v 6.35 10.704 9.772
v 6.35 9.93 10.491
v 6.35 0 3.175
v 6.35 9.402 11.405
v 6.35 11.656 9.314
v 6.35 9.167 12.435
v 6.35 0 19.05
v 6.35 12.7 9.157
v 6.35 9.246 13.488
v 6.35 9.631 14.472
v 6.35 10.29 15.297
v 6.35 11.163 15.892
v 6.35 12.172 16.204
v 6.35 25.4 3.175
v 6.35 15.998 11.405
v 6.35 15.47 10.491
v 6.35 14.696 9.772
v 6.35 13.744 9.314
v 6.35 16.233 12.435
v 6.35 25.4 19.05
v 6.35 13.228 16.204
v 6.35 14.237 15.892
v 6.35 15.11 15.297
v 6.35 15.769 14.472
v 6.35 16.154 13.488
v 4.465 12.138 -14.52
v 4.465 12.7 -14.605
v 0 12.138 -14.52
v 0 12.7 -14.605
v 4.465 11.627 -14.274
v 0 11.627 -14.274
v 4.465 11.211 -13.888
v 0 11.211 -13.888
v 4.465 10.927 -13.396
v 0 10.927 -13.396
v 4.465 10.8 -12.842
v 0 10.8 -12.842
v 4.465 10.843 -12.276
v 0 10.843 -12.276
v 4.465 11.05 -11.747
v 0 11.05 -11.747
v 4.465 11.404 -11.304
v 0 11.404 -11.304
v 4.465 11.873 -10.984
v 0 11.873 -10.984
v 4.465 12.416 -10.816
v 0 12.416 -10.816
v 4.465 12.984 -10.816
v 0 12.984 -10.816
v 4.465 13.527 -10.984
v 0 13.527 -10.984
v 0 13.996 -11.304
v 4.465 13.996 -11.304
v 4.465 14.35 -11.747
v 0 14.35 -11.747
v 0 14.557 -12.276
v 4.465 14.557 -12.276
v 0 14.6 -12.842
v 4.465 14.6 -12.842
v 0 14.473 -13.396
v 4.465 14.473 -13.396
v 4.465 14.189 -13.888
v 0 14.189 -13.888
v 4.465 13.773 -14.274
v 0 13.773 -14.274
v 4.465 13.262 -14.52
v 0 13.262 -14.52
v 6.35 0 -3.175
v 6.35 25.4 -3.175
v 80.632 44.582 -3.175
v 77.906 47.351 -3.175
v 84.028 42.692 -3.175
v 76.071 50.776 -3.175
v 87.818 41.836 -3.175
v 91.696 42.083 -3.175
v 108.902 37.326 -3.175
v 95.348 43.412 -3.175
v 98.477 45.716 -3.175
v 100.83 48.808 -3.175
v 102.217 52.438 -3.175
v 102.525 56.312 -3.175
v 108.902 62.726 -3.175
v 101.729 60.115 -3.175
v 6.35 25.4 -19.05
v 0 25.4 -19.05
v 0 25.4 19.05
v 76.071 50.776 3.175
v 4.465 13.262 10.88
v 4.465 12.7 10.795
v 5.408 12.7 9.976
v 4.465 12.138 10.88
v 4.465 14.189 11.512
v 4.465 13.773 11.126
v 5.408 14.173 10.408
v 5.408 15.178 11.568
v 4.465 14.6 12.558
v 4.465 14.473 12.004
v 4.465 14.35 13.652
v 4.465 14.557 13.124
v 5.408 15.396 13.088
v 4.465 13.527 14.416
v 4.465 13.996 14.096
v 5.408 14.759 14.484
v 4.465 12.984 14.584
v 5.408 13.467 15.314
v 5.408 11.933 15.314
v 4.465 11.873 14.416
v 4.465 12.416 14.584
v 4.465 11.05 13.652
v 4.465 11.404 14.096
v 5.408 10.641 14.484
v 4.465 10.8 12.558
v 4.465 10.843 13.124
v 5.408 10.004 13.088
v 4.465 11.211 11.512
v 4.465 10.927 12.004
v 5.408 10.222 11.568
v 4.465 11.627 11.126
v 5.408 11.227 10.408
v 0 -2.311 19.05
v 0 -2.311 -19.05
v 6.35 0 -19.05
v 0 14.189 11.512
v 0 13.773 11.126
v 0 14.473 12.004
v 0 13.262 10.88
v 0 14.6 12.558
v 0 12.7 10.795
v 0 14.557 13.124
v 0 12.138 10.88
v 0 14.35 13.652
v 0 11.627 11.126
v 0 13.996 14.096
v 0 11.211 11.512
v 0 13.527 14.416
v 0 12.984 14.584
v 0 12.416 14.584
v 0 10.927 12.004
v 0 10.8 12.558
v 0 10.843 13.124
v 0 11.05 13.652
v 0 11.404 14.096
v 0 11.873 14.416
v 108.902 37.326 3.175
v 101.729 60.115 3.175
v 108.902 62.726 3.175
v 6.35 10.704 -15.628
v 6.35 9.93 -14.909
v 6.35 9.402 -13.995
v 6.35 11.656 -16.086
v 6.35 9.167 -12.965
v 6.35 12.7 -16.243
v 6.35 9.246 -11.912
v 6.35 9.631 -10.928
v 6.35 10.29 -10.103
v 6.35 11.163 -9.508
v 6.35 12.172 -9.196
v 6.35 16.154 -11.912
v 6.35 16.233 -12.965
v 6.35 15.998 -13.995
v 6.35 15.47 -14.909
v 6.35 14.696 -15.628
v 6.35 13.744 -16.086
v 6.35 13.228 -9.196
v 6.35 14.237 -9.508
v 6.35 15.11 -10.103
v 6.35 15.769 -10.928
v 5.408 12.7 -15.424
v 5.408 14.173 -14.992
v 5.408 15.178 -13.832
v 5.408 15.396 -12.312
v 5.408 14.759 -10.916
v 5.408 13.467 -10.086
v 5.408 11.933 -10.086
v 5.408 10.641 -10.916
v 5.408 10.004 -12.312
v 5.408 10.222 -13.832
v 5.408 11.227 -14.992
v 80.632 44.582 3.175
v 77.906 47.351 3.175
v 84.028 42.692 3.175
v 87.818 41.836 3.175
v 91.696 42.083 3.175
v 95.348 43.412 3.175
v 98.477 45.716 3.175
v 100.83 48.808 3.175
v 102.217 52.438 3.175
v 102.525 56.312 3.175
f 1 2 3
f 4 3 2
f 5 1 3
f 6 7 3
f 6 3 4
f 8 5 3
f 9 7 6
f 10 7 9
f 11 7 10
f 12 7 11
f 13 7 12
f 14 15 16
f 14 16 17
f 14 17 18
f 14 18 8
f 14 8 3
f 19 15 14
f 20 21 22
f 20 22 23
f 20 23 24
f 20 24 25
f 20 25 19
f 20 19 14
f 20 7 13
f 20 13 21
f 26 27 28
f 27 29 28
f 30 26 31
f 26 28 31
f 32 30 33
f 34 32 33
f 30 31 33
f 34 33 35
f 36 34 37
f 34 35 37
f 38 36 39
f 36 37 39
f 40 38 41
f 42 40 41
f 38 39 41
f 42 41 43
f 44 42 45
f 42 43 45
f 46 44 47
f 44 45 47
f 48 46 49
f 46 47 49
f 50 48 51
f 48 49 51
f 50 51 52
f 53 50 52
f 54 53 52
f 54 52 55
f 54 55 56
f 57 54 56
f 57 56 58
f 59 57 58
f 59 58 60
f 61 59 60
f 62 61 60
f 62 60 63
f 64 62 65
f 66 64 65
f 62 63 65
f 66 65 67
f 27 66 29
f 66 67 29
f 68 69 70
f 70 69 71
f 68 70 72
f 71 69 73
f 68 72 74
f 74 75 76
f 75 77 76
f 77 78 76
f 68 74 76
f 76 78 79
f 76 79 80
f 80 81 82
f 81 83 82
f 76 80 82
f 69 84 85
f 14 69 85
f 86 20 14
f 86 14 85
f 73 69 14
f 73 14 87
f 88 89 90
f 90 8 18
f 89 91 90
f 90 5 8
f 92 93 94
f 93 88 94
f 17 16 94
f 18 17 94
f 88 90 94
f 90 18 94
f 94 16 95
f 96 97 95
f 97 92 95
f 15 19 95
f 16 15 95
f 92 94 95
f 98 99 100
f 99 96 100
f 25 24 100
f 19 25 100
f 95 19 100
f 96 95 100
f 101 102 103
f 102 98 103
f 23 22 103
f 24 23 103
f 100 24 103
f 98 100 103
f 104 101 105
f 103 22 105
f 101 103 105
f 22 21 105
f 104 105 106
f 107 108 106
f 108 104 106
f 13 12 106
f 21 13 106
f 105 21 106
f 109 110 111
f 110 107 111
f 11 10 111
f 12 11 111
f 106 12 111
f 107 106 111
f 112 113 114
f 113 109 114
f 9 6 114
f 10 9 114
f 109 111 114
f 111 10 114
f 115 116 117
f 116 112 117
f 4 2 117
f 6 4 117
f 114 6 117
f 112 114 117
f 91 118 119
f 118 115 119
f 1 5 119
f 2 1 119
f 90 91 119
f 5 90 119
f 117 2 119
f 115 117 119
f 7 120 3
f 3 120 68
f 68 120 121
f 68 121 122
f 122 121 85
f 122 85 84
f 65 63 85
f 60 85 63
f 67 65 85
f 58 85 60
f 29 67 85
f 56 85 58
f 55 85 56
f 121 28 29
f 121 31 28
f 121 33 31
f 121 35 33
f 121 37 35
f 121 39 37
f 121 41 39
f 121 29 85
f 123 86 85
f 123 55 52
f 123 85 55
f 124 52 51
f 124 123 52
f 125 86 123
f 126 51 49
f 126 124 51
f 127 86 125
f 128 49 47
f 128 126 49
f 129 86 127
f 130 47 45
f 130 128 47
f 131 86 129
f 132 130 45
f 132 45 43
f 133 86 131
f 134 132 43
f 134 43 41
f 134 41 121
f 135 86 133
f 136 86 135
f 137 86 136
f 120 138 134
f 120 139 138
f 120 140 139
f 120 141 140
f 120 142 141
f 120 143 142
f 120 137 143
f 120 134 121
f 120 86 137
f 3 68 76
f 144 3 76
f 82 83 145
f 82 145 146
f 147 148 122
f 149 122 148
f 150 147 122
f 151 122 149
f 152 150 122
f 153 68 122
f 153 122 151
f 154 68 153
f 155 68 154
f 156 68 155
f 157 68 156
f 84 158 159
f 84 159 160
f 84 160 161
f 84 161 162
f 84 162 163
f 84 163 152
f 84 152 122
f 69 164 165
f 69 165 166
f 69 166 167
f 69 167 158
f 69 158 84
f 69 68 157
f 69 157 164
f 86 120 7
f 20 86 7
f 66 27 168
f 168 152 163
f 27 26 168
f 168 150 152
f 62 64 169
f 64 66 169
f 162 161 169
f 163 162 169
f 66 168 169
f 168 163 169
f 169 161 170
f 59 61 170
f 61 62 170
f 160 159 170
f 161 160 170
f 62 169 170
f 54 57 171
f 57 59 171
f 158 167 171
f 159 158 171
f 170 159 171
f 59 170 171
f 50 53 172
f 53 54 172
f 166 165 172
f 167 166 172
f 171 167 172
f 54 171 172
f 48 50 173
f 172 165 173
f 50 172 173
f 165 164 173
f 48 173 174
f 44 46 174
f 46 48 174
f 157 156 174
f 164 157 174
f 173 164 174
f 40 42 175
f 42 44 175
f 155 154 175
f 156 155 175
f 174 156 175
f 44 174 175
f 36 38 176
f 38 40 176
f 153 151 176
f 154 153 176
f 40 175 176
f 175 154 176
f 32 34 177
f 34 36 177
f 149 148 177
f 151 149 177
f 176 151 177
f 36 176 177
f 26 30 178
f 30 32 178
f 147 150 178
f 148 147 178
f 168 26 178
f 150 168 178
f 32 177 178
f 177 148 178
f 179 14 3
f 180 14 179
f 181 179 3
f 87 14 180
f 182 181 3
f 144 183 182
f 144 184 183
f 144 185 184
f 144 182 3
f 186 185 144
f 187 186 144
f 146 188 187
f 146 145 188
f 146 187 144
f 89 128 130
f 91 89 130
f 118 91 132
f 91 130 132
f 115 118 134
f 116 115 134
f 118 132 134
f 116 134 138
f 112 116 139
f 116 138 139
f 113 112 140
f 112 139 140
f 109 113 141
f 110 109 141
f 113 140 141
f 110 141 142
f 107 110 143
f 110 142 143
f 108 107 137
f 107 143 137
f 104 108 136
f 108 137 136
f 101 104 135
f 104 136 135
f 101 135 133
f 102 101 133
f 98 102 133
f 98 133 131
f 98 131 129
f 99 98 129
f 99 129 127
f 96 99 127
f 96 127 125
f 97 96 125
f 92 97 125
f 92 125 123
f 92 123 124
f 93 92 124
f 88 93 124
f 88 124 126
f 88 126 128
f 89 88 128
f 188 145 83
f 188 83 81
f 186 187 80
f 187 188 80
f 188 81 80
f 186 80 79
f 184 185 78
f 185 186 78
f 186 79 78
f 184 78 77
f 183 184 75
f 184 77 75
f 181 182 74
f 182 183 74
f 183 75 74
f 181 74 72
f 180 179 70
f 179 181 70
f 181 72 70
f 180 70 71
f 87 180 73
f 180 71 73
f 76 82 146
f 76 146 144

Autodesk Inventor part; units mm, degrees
ref_plane "YZ Plane" through (0, 0, 0) normal (1, 0, 0) x (0, 1, 0)
ref_plane "XZ Plane" through (0, 0, 0) normal (0, 1, 0) x (-1, 0, 0)
ref_plane "XY Plane" through (0, 0, 0) normal (0, 0, 1) x (1, 0, 0)
sketch "Sketch5" plane through (0, 0, 0) normal (0, 0, 1) x (1, 0, 0)
  line L0 (0, 0) -> (6.35, 0)
  line L1 (6.35, 0) -> (6.35, 25.4)
  line L2 (6.35, 25.4) -> (0, 25.4)
  line L3 (0, 25.4) -> (0, 0)
  dimension "d21" = 25.4
  dimension "d22" = 6.35
extrude "Extrusion3" add sketch "Sketch5" against normal mid plane 38.1
sketch "Sketch6" plane through (0, 0, 0) normal (0, 0, 1) x (1, 0, 0)
  line L0 (6.35, 25.4) -> (6.35, 0) projected
  line L1 (0, 25.4) -> (6.35, 25.4) projected
  line L2 (6.35, 0) -> (0, 0) projected
  line L3 (0, 0) -> (0, 25.4) projected
  line L4 (6.35, 0) -> (108.9025, 37.3261)
  line L5 (6.35, 0) -> (115.4841, 0) construction
  line L6 (108.9025, 62.7261) -> (108.9025, 37.3261)
  arc A0 (76.0708, 50.7763) -> (101.7292, 60.1152) centre (88.9, 55.4457) ccw
  line L7 (6.35, 25.4) -> (76.0708, 50.7763)
  line L8 (101.7292, 60.1152) -> (108.9025, 62.7261)
  dimension "d25" = 20
  dimension "d26" = 27.305
  dimension "d29" = 6.35
  dimension "d30" = 88.9
  dimension "d33" = 0
extrude "Extrusion4" add sketch "Sketch6" along normal mid plane 6.35 contours L7 A0 L8 L6 L4 L0
sketch "Sketch7" plane through (6.35, 0, 19.05) normal (1, 0, 0) x (0, 0, -1)
  line L0 (38.1, 25.4) -> (0, 25.4) construction
  line L1 (6.35, 25.4) -> (6.35, 0) construction
  line L2 (31.75, 25.4) -> (31.75, 0) construction
  line L3 (0, 0) -> (0, 25.4) construction
  line L4 (38.1, 25.4) -> (38.1, 0) construction
  line L5 (0, 0) -> (15.875, 0) projected
  line L6 (22.225, 0) -> (38.1, 0) projected
  point P0 (19.05, 0)
  point P1 (6.35, 12.7)
  point P2 (31.75, 12.7)
  dimension "d34" = 6.35
  dimension "d35" = 6.35
sketch "Sketch8" plane through (0, 0, 0) normal (0, 0, 1) x (1, 0, 0)
  line L0 (0, 0) -> (0, 25.4) projected
  line L1 (6.35, 0) -> (0, 0) projected
  line L2 (108.9025, 37.3261) -> (6.35, 0) projected
  line L3 (0, 0) -> (6.35, 0)
  line L4 (0, -2.3112) -> (6.35, 0)
  line L5 (0, 0) -> (0, -2.3112)
extrude "Extrusion5" add sketch "Sketch8" along normal mid plane 38.1
hole "Hole3" at (6.35, 12.7, 12.7) at (6.35, 12.7, -12.7) direction (-1, 0, 0) diameter 3.81 end through all countersink diameter 7.0866 countersink angle 82 clearance for "Flat Head Machine Screw (82)" size "#6" standard "Ansi Unified Screw Threads"
equation "\"d21\" = supportHeight"
equation "\"d22\" = supportWidth"
equation "\"d23\" = totalScrewHoldWidth"
equation "\"d25\" = supportAngle"
equation "\"d26\" = pipeDiameter"
equation "\"d30\" = distanceFromWallToPipeCenter"
equation "\"d31\" = supportWidth"
equation "\"d47\" = totalScrewHoldWidth"
equation "\"pipeDiameter\" = 27.305"
equation "\"distanceFromWallToPipeCenter\" = 88.9"
equation "\"supportHeight\" = 25.4"
equation "\"supportWidth\" = 6.35"
equation "\"screwHoldDepth\" = 6.35"
equation "\"totalScrewHoldWidth\" = 38.1"
equation "\"screwPositionFromTop\" = 6.35"
equation "\"supportAngle\" = 20deg"
properties part number "PipeSupport-3_50-020"
